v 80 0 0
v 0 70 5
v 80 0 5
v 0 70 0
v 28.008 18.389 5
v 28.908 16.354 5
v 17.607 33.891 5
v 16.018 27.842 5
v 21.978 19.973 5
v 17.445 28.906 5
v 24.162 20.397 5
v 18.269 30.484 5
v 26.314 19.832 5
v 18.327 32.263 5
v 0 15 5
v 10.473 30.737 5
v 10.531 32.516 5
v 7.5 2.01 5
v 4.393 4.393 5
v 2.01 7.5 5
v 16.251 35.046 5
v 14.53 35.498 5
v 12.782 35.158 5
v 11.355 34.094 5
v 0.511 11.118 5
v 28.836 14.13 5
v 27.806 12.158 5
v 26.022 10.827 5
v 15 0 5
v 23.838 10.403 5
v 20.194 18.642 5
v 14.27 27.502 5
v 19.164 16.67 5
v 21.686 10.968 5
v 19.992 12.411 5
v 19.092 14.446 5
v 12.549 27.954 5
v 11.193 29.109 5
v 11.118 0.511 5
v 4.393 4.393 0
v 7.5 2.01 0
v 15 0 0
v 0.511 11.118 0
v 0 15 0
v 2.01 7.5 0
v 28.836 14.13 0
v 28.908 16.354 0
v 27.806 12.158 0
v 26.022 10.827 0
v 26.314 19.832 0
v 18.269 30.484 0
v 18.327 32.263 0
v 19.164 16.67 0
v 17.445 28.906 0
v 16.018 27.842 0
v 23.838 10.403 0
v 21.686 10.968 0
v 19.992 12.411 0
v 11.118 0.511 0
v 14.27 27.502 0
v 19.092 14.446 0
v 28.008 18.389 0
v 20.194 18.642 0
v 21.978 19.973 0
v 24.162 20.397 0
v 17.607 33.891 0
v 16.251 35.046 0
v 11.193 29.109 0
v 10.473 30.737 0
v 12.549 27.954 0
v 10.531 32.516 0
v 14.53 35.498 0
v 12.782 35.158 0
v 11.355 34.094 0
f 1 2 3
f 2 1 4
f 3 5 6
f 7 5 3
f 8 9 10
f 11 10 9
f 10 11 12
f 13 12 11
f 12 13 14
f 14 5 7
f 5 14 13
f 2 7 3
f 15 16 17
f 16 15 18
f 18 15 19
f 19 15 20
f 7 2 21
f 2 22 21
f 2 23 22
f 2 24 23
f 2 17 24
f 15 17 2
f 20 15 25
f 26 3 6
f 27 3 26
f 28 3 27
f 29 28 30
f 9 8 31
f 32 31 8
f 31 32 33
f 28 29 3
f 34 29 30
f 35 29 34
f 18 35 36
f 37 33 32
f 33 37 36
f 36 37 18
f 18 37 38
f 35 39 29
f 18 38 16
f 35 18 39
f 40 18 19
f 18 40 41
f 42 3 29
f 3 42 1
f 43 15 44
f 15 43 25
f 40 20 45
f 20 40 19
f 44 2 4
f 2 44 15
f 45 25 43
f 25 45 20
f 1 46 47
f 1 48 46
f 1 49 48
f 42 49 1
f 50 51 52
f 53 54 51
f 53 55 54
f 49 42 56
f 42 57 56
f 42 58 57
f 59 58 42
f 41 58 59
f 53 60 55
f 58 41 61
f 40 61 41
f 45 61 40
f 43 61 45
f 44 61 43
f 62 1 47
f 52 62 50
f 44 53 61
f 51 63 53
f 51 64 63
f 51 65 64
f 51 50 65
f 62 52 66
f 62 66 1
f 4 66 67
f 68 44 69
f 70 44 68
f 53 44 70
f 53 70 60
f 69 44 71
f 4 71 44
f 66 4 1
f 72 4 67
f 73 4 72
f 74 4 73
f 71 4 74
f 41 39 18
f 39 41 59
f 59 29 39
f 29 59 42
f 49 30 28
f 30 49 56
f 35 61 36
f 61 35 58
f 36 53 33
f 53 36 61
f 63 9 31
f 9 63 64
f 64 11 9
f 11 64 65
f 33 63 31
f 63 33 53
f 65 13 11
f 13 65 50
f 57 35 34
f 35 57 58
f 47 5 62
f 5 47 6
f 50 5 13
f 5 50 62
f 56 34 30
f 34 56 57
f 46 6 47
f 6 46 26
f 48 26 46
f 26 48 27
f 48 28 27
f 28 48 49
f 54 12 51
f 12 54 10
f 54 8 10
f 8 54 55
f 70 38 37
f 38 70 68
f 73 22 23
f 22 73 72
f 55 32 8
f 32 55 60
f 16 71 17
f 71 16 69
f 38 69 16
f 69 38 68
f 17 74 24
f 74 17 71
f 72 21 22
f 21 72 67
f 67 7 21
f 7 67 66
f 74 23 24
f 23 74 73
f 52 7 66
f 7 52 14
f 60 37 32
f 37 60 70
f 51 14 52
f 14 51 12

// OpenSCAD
$fn = 32;

// ----------------------------------------------------------------------
// Bracket plate: corner pad 80 x 70, fillet R15
// ----------------------------------------------------------------------

// --- parameters (mm) ---
hole_r = 4;               // bolt hole radius
plate_t = 5;              // plate thickness, Z (extrusion height)
leg_a = 80;               // base leg
leg_b = 70;               // height leg
fillet_r = 15;            // right-angle fillet radius

hole_d1 = 2 * hole_r + 2;
hole_d2 = 2 * hole_r;

profile = [[15, 0], [80, 0], [0, 70], [0, 15], [0.511, 11.118], [2.01, 7.5], [4.393, 4.393], [7.5, 2.01], [11.118, 0.511]];  // primary outline, 9 points, counter clockwise
void_1 = [[28.908, 16.354], [28.008, 18.389], [26.314, 19.832], [24.162, 20.397], [21.978, 19.973], [20.194, 18.642], [19.164, 16.67], [19.092, 14.446], [19.992, 12.411], [21.686, 10.968], [23.838, 10.403], [26.022, 10.827], [27.806, 12.158], [28.836, 14.13]];  // mount hole 1, 14 points
void_2 = [[18.327, 32.263], [17.607, 33.891], [16.251, 35.046], [14.53, 35.498], [12.782, 35.158], [11.355, 34.094], [10.531, 32.516], [10.473, 30.737], [11.193, 29.109], [12.549, 27.954], [14.27, 27.502], [16.018, 27.842], [17.445, 28.906], [18.269, 30.484]];  // mount hole 2, 14 points

// --- the one profile operation ---
difference() {
  linear_extrude(height = plate_t) polygon(points = profile);
  translate([0, 0, -1])
    linear_extrude(height = plate_t + 2) polygon(points = void_1);
  translate([0, 0, -1])
    linear_extrude(height = plate_t + 2) polygon(points = void_2);
}
